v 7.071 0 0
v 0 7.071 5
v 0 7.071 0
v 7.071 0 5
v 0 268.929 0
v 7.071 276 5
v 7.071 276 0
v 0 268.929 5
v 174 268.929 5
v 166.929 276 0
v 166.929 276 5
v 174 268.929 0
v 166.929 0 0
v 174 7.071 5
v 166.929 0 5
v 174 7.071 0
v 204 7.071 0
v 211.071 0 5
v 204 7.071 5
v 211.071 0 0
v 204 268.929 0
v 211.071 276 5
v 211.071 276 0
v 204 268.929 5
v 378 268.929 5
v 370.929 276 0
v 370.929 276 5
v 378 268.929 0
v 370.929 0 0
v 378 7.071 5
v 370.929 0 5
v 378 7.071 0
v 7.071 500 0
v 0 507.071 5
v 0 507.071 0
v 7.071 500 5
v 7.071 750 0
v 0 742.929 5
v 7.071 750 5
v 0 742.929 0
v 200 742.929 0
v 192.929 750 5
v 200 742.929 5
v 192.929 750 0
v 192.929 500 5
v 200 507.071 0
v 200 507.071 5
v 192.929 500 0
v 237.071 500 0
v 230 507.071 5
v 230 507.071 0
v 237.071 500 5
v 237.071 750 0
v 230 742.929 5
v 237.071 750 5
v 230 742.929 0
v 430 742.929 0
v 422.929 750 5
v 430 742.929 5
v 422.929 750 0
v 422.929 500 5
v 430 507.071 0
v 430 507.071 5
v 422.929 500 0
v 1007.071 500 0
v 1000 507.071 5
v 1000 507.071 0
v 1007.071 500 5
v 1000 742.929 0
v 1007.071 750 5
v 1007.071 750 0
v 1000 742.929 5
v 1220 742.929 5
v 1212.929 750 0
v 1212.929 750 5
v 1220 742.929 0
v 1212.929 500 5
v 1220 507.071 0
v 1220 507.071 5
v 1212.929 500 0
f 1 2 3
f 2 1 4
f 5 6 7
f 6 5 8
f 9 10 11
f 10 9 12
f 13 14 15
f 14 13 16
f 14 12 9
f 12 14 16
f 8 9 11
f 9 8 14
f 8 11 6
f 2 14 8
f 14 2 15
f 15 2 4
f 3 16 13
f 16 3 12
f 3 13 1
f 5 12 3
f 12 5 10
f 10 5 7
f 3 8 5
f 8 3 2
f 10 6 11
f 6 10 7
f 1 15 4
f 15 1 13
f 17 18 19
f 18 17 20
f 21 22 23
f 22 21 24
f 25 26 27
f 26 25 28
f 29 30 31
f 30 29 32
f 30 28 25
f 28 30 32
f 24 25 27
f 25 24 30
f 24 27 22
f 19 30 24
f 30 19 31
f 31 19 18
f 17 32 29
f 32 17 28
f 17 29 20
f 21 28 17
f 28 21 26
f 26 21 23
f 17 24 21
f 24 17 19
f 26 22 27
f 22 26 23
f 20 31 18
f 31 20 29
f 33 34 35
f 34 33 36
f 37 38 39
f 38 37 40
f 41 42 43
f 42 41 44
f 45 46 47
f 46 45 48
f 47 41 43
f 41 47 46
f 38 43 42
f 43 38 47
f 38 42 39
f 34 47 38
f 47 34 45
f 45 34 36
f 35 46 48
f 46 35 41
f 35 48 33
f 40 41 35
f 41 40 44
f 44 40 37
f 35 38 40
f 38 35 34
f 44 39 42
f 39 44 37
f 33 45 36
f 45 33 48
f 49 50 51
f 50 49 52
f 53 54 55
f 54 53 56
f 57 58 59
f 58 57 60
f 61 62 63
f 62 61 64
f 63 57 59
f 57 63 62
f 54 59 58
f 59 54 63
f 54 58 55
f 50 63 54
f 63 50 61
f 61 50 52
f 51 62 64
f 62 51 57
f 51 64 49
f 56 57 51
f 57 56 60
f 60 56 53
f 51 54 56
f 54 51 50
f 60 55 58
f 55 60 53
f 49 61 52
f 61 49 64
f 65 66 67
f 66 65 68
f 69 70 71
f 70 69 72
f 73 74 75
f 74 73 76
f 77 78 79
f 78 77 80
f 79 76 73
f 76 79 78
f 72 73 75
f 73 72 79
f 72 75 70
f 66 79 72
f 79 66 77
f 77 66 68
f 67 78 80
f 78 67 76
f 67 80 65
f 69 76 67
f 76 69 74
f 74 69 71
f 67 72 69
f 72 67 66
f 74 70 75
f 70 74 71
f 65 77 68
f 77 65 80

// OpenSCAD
include <../src/wardrobe.scad>;
cnc_slab_batch();
//github_openscad -o wardrobe_1/cnc_slab_batch.stl -D wardrobe_n=1 -D cutting_edge=0 -D break_view_length=0 wardrobe_1/cnc_slab_batch_stl.scad
